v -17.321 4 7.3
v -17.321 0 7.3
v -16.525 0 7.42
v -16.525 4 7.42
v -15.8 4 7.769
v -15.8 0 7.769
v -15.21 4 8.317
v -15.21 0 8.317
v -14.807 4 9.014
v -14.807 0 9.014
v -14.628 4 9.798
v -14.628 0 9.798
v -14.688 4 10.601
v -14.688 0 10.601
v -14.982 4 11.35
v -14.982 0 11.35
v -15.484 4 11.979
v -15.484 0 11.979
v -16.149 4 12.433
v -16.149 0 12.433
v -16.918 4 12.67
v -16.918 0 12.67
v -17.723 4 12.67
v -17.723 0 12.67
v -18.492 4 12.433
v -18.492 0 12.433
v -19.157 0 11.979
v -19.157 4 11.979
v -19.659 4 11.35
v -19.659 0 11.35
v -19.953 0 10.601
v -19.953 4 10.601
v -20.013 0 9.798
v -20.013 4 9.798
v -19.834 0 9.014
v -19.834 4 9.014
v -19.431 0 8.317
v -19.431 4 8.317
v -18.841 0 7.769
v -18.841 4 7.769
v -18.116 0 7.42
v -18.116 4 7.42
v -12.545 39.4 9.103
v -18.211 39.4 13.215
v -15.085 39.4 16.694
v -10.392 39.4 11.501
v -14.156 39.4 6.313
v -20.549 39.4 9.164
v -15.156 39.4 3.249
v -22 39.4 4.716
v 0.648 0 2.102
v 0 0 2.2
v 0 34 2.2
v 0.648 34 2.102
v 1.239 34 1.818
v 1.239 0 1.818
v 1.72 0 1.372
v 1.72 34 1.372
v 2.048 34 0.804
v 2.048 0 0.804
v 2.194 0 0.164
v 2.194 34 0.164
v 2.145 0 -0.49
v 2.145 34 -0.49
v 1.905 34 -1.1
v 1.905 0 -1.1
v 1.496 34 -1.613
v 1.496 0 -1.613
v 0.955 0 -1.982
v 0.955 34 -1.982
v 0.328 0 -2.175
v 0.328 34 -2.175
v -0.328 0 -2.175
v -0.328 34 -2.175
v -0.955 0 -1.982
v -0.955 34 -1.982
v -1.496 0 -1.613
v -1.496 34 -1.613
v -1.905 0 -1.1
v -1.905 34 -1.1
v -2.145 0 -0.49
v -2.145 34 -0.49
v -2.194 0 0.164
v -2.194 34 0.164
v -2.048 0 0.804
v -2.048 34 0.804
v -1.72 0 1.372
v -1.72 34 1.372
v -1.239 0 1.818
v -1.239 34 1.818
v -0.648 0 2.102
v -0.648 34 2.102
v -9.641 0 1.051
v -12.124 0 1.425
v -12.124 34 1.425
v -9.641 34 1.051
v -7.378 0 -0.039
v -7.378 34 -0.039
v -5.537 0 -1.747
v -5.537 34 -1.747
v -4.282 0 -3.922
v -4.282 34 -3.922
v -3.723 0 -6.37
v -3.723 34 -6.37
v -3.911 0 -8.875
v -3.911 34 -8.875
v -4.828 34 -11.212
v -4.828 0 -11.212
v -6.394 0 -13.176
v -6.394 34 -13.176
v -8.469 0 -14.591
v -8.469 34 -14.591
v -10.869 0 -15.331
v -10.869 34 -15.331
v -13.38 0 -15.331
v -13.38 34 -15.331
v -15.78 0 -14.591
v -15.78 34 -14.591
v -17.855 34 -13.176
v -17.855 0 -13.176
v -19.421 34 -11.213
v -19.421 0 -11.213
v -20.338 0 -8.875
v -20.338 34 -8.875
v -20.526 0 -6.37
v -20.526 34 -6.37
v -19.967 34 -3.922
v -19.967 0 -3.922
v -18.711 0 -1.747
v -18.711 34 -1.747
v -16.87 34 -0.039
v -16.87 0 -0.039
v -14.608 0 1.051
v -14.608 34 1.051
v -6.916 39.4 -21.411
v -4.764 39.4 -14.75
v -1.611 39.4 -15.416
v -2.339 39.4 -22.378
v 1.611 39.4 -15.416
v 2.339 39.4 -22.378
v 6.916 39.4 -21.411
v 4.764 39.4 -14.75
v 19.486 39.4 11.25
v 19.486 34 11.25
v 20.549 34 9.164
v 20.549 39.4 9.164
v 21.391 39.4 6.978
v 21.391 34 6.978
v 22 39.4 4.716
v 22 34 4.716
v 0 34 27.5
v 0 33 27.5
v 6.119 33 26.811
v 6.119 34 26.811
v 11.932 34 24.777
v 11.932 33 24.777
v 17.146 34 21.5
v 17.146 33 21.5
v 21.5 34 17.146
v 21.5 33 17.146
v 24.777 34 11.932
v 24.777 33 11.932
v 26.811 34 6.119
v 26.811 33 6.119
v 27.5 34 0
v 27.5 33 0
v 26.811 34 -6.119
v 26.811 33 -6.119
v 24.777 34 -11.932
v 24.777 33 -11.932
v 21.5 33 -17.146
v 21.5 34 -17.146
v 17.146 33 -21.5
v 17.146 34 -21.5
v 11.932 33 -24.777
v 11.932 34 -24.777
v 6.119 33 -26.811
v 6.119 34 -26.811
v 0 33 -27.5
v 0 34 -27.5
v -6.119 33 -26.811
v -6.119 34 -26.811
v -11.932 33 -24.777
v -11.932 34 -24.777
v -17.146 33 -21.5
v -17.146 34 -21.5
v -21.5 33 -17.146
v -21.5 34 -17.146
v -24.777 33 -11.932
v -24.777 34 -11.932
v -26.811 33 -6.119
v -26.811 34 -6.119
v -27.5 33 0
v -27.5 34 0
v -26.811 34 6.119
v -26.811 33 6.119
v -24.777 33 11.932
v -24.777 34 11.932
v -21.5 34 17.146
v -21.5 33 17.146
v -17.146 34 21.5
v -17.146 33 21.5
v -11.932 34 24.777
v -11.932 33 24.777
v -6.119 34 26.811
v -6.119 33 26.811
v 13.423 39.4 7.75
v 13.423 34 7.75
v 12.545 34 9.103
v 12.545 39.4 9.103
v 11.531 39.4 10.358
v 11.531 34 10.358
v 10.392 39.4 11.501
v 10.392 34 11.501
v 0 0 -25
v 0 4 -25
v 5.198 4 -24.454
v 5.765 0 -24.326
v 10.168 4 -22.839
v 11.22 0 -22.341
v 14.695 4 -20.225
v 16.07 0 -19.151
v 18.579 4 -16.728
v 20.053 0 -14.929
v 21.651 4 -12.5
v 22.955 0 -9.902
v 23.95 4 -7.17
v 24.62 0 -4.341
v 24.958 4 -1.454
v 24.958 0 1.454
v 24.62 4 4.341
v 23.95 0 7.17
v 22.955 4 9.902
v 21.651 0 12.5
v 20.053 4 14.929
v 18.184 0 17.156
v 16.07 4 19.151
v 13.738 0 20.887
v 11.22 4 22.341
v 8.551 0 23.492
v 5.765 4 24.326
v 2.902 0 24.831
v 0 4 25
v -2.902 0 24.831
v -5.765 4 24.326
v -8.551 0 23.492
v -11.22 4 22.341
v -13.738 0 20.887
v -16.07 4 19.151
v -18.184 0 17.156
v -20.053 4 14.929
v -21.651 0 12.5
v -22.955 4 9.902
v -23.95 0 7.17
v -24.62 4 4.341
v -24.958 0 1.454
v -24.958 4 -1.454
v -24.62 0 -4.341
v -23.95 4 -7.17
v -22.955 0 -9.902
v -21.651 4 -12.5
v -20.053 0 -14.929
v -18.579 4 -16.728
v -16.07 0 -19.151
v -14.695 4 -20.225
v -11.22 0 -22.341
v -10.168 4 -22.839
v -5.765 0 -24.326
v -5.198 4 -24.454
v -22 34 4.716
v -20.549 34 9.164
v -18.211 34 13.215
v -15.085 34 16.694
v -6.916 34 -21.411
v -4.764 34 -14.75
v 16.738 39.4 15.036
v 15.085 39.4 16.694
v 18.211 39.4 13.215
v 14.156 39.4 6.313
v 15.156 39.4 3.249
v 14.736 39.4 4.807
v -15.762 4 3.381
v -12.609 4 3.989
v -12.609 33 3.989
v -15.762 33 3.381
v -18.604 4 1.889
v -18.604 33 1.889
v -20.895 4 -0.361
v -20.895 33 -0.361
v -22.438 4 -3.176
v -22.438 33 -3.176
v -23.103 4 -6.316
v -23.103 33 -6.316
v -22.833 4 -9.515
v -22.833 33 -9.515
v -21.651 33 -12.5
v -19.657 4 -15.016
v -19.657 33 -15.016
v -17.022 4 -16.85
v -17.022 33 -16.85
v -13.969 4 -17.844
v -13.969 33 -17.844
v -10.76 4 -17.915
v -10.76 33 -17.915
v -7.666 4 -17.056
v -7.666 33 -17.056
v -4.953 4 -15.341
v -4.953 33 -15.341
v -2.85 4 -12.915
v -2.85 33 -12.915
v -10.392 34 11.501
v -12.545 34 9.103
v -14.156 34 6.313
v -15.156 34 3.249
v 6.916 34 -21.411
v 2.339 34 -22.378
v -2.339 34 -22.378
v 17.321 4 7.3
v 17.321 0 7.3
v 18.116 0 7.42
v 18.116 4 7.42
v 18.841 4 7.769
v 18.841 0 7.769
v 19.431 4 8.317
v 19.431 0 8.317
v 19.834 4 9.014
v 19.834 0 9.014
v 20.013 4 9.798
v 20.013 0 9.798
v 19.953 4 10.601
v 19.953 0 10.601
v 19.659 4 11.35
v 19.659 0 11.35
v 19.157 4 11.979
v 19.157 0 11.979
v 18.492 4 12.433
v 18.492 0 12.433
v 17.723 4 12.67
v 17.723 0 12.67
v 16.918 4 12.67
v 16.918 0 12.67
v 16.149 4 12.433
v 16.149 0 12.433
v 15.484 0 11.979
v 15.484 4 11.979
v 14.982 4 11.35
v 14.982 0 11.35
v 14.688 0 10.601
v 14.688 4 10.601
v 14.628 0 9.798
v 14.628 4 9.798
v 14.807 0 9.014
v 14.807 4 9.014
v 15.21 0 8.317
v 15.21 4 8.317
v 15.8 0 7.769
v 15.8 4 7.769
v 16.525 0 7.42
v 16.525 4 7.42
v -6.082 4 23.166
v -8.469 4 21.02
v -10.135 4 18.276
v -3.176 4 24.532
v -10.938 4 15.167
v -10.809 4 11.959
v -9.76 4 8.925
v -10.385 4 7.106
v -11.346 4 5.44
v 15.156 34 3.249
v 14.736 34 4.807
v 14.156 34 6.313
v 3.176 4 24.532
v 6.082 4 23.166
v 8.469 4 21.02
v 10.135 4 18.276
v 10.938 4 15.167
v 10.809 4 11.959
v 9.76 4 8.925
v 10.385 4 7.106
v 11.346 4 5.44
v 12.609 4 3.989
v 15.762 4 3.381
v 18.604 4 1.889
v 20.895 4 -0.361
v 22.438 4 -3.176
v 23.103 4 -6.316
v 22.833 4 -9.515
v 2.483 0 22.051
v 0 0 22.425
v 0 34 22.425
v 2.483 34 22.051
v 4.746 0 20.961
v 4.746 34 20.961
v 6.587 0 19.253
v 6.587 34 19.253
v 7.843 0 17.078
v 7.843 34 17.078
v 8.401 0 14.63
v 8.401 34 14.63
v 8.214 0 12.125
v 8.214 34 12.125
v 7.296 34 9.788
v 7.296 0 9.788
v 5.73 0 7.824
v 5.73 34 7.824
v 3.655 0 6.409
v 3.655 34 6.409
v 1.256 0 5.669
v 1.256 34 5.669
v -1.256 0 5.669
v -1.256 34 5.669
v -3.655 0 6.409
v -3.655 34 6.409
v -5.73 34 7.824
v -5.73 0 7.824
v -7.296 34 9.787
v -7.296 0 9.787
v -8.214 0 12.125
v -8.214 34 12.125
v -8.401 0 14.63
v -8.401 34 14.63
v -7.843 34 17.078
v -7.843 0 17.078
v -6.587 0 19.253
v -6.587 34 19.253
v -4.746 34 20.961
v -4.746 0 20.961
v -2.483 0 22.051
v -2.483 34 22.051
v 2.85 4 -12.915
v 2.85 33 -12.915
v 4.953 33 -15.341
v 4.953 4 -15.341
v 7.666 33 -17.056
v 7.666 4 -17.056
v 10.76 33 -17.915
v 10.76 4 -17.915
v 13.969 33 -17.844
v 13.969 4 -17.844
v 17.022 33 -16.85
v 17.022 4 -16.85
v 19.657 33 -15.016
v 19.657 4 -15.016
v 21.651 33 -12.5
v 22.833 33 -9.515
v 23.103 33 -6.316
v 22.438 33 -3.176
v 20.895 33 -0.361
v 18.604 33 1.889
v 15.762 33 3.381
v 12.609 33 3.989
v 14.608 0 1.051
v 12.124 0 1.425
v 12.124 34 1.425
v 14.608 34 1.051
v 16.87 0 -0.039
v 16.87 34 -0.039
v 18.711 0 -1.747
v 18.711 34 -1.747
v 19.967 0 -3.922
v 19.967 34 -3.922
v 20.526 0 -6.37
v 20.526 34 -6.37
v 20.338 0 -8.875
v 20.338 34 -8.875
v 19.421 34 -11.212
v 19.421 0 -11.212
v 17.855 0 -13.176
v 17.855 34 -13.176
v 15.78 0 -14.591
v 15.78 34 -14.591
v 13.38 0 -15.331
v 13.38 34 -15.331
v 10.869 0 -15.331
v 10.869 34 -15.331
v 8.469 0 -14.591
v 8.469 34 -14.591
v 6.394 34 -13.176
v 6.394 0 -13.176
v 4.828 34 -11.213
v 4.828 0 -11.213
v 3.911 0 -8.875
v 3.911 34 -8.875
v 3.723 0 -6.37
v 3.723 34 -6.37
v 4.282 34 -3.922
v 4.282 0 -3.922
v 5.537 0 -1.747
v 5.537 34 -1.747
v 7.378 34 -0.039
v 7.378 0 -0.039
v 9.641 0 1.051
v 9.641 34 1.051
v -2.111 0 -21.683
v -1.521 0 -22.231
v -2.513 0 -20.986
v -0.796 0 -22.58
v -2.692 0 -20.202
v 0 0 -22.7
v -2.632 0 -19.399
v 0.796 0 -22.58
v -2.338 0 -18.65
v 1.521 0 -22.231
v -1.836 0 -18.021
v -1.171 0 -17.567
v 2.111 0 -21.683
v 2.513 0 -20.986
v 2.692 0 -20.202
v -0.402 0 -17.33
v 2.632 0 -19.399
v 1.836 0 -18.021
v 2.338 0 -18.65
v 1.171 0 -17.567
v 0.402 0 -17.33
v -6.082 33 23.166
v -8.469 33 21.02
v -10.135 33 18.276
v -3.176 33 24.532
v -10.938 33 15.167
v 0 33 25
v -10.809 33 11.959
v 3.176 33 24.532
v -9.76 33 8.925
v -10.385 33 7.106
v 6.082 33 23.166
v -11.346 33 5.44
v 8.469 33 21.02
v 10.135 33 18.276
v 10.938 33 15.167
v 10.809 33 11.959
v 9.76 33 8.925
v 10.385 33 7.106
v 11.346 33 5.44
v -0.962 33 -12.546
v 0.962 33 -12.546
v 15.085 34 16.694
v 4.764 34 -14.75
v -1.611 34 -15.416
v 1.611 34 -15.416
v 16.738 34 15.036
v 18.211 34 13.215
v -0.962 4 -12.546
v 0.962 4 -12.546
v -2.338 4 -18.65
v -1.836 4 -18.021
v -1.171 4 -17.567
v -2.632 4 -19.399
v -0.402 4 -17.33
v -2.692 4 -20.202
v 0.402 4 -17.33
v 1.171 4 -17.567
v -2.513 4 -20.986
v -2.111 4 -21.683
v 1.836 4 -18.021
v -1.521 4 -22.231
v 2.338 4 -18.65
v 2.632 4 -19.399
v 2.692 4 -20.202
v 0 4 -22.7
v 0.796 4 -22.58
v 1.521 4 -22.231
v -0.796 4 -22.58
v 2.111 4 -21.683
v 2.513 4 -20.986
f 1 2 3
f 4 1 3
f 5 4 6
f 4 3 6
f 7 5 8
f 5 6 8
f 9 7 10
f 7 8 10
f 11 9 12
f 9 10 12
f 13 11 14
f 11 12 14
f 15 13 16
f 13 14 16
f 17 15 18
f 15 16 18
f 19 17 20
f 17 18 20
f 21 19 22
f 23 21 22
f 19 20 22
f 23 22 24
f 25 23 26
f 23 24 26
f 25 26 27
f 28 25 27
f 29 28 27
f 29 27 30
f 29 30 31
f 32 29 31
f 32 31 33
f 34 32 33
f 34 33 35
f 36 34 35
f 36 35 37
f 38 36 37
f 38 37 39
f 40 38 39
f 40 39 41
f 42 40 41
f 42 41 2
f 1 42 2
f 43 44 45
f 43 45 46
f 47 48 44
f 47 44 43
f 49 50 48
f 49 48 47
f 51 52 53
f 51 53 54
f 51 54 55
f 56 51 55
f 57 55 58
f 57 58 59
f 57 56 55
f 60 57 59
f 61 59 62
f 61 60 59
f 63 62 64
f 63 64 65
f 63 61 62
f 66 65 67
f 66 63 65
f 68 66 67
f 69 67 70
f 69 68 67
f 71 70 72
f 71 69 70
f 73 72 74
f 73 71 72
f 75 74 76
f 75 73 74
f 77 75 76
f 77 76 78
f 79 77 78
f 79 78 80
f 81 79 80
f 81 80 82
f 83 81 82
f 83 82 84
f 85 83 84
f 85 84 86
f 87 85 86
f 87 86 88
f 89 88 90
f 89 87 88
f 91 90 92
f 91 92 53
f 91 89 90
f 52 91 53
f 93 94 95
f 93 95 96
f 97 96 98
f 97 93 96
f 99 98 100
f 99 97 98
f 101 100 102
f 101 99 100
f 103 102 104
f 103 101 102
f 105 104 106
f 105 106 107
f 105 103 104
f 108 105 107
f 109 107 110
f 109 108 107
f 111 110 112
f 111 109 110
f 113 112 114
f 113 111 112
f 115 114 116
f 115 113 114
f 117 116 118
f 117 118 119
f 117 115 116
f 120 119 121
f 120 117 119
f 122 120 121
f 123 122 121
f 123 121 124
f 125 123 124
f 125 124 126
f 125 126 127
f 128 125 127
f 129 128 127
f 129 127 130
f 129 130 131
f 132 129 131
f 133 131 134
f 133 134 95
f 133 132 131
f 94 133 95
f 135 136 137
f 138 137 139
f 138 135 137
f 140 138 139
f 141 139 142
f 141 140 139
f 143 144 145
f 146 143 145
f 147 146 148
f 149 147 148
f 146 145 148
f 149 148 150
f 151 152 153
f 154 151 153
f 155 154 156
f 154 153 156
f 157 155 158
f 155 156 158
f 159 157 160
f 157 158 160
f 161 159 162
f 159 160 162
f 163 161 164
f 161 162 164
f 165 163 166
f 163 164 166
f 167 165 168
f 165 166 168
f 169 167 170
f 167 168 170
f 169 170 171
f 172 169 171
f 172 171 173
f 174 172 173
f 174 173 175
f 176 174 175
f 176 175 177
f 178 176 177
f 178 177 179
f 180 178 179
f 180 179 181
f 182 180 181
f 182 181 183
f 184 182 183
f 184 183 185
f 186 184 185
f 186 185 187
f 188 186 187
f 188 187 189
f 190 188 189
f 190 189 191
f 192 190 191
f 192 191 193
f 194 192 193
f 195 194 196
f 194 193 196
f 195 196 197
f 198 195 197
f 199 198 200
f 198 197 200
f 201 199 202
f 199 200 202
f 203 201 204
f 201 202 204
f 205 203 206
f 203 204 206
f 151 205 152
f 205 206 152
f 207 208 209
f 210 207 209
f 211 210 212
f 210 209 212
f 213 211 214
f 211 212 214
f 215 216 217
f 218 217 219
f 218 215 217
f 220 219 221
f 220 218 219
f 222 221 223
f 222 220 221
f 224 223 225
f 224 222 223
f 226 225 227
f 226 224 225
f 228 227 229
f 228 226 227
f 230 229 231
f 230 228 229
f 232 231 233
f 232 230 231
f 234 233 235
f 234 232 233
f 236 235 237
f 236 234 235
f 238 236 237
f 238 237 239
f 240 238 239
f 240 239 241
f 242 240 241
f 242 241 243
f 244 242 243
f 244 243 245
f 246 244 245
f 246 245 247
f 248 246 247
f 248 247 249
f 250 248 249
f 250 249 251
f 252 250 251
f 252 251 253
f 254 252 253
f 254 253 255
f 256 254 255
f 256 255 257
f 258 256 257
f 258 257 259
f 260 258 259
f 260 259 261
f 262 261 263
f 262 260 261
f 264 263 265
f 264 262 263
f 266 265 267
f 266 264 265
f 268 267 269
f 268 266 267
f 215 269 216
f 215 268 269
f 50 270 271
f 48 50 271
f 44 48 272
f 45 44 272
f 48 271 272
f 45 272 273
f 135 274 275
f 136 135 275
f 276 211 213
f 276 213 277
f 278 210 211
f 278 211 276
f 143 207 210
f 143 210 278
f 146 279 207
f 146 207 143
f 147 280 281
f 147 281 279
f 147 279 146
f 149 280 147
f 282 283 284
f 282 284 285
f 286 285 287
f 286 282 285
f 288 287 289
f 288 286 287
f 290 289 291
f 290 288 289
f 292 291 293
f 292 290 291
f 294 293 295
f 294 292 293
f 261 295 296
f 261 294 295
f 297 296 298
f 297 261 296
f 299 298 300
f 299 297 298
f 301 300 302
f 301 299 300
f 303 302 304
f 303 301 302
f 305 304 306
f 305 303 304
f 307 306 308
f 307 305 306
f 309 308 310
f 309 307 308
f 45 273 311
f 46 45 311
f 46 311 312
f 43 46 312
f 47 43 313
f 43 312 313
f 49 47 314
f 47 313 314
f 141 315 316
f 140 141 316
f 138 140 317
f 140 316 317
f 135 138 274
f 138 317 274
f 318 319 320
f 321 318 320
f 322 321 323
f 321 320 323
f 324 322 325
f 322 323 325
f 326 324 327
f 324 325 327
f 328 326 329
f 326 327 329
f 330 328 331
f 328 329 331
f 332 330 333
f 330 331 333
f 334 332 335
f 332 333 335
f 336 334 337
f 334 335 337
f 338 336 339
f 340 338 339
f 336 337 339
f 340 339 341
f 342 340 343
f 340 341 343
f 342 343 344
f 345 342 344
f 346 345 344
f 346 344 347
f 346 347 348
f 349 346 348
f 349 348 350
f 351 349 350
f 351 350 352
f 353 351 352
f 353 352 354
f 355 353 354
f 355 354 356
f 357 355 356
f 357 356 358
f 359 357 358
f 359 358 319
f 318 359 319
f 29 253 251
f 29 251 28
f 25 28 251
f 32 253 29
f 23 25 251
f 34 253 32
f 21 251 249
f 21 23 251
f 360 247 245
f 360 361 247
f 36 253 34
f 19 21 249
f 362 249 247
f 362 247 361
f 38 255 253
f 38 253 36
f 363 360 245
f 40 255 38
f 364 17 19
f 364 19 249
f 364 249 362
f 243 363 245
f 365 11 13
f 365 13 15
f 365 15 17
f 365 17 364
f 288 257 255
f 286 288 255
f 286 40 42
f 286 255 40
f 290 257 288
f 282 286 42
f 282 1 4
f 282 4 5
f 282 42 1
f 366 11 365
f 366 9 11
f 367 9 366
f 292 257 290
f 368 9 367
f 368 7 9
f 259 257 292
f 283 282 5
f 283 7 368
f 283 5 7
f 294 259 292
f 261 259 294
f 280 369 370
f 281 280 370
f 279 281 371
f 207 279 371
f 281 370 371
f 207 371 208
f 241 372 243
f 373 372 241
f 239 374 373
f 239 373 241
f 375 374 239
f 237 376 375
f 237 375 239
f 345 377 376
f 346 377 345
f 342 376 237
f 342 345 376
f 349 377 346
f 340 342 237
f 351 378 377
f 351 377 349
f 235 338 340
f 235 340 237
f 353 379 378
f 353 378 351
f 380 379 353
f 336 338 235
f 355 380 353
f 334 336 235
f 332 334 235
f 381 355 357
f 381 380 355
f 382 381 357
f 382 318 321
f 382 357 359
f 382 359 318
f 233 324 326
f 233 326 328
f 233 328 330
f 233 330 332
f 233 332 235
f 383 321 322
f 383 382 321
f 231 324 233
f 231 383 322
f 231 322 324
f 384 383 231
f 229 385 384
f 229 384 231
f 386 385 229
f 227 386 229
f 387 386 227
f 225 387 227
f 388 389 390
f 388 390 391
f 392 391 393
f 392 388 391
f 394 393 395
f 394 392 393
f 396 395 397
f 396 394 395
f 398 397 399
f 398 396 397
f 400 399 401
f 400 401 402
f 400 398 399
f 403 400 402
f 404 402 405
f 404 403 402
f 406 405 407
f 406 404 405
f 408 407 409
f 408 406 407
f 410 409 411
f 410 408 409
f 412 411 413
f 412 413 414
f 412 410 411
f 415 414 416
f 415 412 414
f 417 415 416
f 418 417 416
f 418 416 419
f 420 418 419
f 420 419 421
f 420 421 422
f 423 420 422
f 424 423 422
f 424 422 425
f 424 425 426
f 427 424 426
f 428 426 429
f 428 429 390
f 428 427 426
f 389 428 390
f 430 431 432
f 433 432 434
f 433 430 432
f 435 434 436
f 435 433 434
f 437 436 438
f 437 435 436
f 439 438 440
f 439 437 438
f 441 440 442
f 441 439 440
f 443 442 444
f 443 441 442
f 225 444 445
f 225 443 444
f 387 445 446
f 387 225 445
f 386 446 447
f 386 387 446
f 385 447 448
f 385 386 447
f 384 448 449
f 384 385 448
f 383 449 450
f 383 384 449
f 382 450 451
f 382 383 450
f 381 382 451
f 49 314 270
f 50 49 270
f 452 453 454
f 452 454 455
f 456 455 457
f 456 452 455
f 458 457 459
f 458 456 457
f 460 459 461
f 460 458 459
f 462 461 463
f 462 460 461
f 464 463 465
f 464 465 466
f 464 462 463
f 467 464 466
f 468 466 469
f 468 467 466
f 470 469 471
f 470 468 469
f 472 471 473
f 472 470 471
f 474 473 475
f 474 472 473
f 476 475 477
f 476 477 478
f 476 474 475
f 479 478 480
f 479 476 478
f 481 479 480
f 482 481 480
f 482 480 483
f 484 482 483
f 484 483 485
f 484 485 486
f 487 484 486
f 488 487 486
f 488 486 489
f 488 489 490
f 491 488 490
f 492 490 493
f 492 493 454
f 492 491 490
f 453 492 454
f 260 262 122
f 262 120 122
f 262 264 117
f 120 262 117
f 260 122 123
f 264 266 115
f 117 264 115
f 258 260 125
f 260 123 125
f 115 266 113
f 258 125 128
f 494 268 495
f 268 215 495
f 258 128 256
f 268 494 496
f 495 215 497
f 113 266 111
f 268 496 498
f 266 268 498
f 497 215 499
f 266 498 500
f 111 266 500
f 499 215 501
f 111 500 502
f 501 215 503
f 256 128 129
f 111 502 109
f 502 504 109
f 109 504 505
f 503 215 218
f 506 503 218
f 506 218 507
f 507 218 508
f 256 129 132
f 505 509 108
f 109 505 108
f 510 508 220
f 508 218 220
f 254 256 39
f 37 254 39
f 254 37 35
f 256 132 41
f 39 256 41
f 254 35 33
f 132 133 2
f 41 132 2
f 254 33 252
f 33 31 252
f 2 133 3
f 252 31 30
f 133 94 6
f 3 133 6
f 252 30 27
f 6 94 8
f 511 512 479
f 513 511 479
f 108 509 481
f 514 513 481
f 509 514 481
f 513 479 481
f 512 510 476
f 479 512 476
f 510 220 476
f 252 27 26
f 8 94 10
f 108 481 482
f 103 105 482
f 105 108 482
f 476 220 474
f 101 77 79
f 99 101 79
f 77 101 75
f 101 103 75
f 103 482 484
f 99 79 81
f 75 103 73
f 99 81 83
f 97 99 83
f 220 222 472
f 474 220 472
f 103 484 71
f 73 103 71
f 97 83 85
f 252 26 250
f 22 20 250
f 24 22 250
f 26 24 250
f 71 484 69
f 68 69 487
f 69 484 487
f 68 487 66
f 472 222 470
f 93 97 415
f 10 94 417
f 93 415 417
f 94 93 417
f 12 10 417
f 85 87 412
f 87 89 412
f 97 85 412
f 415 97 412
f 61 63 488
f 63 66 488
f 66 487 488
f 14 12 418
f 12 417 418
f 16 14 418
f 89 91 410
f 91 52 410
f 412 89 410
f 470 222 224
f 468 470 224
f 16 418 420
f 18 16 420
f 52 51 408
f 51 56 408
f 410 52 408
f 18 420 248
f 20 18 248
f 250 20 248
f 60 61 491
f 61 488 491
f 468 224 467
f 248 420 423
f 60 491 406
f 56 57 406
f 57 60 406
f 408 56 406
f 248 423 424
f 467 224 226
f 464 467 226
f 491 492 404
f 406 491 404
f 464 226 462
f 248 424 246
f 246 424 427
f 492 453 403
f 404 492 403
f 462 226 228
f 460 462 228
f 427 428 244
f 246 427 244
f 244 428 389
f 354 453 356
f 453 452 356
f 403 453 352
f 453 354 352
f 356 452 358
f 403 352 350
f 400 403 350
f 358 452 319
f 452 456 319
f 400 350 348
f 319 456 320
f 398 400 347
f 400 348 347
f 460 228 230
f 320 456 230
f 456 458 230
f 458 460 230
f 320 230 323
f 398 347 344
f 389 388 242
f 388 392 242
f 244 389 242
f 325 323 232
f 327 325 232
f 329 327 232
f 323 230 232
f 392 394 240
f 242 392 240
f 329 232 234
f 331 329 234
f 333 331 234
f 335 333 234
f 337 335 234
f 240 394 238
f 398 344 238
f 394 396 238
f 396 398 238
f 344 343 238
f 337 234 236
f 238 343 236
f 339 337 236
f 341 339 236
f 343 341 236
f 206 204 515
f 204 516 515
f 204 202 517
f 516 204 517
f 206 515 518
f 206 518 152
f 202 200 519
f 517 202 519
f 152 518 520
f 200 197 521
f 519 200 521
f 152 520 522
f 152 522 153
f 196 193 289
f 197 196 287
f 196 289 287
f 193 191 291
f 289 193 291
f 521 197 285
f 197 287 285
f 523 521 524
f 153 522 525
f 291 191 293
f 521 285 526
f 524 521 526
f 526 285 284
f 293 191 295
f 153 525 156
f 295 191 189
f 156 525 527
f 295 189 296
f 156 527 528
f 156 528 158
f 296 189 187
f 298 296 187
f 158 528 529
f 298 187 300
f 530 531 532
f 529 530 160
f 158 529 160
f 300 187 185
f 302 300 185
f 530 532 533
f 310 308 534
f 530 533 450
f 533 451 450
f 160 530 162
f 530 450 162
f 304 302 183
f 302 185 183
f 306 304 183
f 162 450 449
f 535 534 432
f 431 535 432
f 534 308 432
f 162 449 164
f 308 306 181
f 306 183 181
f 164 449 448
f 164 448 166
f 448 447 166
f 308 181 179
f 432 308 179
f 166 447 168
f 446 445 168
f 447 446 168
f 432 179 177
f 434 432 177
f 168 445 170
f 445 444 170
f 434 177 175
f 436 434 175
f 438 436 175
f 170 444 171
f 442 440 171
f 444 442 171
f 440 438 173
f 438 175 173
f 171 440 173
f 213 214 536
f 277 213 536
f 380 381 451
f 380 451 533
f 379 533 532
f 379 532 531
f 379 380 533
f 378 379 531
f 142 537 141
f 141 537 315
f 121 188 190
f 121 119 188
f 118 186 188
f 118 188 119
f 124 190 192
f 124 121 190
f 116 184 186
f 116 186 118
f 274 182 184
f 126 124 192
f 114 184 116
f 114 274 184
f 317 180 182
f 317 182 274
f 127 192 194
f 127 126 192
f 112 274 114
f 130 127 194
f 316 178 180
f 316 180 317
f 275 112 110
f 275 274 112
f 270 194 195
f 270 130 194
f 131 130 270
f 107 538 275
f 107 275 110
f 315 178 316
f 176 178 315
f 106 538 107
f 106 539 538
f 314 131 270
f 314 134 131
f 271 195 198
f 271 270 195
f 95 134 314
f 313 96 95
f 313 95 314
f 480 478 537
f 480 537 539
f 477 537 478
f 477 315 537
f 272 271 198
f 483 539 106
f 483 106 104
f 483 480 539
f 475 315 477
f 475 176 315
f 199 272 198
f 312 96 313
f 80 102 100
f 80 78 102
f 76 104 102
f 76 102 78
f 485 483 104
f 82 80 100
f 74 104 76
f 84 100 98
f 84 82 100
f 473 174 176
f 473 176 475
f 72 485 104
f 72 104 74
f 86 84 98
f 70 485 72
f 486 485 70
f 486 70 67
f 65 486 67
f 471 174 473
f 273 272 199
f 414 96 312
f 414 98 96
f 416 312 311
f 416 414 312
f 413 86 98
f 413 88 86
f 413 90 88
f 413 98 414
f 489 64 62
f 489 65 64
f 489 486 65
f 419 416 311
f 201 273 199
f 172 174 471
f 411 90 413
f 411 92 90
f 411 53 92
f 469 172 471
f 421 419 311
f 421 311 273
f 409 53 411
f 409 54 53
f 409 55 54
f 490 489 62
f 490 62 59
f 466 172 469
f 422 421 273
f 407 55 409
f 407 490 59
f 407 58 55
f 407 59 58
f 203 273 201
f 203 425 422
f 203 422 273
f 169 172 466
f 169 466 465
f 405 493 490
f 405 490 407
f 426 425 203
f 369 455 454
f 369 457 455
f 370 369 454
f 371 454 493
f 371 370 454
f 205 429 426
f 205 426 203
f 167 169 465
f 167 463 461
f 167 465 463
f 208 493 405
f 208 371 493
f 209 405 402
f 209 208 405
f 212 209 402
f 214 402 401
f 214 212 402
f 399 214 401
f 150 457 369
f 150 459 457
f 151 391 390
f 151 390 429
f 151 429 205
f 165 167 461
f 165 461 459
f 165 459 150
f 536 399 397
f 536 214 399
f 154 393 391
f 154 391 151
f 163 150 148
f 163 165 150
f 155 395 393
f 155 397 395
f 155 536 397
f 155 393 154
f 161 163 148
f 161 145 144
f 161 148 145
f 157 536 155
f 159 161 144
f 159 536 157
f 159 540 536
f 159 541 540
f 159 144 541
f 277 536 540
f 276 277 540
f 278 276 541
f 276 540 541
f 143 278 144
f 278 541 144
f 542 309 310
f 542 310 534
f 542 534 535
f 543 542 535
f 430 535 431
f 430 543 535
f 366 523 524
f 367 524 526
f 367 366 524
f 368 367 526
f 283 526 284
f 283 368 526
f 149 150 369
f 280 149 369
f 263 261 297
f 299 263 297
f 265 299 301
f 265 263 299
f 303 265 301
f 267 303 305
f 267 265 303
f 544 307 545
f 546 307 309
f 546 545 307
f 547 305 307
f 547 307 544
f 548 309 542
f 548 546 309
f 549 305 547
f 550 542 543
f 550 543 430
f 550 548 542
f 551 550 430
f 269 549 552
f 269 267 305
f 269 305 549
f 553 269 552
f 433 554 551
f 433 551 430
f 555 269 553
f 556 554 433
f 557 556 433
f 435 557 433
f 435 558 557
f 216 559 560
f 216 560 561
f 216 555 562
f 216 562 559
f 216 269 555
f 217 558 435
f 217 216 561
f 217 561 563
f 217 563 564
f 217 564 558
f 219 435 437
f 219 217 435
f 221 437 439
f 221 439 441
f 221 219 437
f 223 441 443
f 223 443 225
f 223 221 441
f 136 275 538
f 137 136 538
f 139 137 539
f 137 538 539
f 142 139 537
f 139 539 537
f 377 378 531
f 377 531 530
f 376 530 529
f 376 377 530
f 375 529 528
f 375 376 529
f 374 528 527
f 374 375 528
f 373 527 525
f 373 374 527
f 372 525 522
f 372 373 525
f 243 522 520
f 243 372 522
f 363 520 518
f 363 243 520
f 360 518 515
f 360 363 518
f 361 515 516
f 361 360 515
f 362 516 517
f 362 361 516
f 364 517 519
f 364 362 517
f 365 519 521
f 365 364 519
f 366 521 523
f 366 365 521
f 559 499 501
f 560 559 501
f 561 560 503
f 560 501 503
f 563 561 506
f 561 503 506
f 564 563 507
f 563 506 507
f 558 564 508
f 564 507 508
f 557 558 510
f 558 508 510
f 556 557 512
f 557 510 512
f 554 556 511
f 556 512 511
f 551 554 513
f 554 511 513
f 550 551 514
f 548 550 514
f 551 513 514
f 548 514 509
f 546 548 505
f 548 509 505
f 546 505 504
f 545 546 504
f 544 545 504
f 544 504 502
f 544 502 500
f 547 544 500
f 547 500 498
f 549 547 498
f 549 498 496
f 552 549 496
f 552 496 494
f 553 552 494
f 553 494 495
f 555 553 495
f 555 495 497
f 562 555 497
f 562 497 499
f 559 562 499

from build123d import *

# Parameters (mm, degrees)
SKETCH1_R           = 27.5
SKETCH1_R_2         = 2.2
SKETCH1_R_3         = 8.425
BOSS_EXTRUDE1_DEPTH = 34
BOSS_EXTRUDE2_DEPTH = 5.4
SKETCH5_R           = 40.989273042
CUT_EXTRUDE1_DEPTH  = 29
SKETCH6_R           = 2.7
CUT_EXTRUDE2_DEPTH  = 5
SKETCH7_R           = 33.756466266
SKETCH7_R_2         = 25
CUT_EXTRUDE6_DEPTH  = 4


with BuildPart() as part:
    # Sketch1 → Boss-Extrude1 (new body)
    with BuildSketch(Plane(origin=(0, 0, 0), x_dir=(1, 0, 0), z_dir=(0, 1, 0))):
        Circle(SKETCH1_R)
        Circle(SKETCH1_R_2, mode=Mode.SUBTRACT)
        with Locations((0, -14)):
            Circle(SKETCH1_R_3, mode=Mode.SUBTRACT)
        with Locations((-12.124355653, 7)):
            Circle(SKETCH1_R_3, mode=Mode.SUBTRACT)
        with Locations((12.124355653, 7)):
            Circle(SKETCH1_R_3, mode=Mode.SUBTRACT)
    extrude(amount=BOSS_EXTRUDE1_DEPTH)

    # Sketch4 → Boss-Extrude2 (add)
    with BuildSketch(Plane(origin=(0, 34, 0), x_dir=(1, 0, 0), z_dir=(0, 1, 0))):
        with BuildLine():
            ThreePointArc((15.15564017, -3.249087725), (13.423393759, -7.75), (10.391612594, -11.500625535))
            Line((10.391612594, -11.500625535), (15.084598927, -16.694456422))
            ThreePointArc((15.084598927, -16.694456422), (19.485571585, -11.25), (22.000122827, -4.716417665))
            Line((22.000122827, -4.716417665), (15.15564017, -3.249087725))
        make_face()
        with BuildLine():
            Line((-15.084598927, -16.694456422), (-10.391612594, -11.500625535))
            ThreePointArc((-10.391612594, -11.500625535), (-13.423393759, -7.75), (-15.15564017, -3.249087725))
            Line((-15.15564017, -3.249087725), (-22.000122827, -4.716417665))
            ThreePointArc((-22.000122827, -4.716417665), (-19.485571585, -11.25), (-15.084598927, -16.694456422))
        make_face()
        with BuildLine():
            ThreePointArc((-4.764027576, 14.74971326), (0, 15.5), (4.764027576, 14.74971326))
            Line((4.764027576, 14.74971326), (6.9155239, 21.410874087))
            ThreePointArc((6.9155239, 21.410874087), (0, 22.5), (-6.9155239, 21.410874087))
            Line((-6.9155239, 21.410874087), (-4.764027576, 14.74971326))
        make_face()
    extrude(amount=BOSS_EXTRUDE2_DEPTH)

    # Sketch5 → Cut-Extrude1 (cut)
    with BuildSketch(Plane(origin=(0, 4, 0), x_dir=(1, 0, 0), z_dir=(0, 1, 0))):
        Circle(SKETCH5_R)
        with BuildLine():
            ThreePointArc((-2.849843175, 12.914678207), (0, 12.5), (2.849843175, 12.914678207))
            ThreePointArc((2.849843175, 12.914678207), (21.650635095, 12.5), (12.609360996, -3.989302517))
            ThreePointArc((12.609360996, -3.989302517), (10.825317547, -6.25), (9.759517821, -8.925375689))
            ThreePointArc((9.759517821, -8.925375689), (0, -25), (-9.759517821, -8.925375689))
            ThreePointArc((-9.759517821, -8.925375689), (-10.825317547, -6.25), (-12.609360996, -3.989302517))
            ThreePointArc((-12.609360996, -3.989302517), (-21.650635095, 12.5), (-2.849843175, 12.914678207))
        make_face(mode=Mode.SUBTRACT)
    extrude(amount=CUT_EXTRUDE1_DEPTH, mode=Mode.SUBTRACT)

    # Sketch6 → Cut-Extrude2 (cut)
    with BuildSketch(Plane.XZ):
        with Locations((0, -20)):
            Circle(SKETCH6_R)
        with Locations((-17.320508076, 10)):
            Circle(SKETCH6_R)
        with Locations((17.320508076, 10)):
            Circle(SKETCH6_R)
    extrude(amount=-CUT_EXTRUDE2_DEPTH, mode=Mode.SUBTRACT)

    # Sketch7 → Cut-Extrude6 (cut)
    with BuildSketch(Plane.XZ):
        Circle(SKETCH7_R)
        Circle(SKETCH7_R_2, mode=Mode.SUBTRACT)
    extrude(amount=-CUT_EXTRUDE6_DEPTH, mode=Mode.SUBTRACT)


solid = part.part
